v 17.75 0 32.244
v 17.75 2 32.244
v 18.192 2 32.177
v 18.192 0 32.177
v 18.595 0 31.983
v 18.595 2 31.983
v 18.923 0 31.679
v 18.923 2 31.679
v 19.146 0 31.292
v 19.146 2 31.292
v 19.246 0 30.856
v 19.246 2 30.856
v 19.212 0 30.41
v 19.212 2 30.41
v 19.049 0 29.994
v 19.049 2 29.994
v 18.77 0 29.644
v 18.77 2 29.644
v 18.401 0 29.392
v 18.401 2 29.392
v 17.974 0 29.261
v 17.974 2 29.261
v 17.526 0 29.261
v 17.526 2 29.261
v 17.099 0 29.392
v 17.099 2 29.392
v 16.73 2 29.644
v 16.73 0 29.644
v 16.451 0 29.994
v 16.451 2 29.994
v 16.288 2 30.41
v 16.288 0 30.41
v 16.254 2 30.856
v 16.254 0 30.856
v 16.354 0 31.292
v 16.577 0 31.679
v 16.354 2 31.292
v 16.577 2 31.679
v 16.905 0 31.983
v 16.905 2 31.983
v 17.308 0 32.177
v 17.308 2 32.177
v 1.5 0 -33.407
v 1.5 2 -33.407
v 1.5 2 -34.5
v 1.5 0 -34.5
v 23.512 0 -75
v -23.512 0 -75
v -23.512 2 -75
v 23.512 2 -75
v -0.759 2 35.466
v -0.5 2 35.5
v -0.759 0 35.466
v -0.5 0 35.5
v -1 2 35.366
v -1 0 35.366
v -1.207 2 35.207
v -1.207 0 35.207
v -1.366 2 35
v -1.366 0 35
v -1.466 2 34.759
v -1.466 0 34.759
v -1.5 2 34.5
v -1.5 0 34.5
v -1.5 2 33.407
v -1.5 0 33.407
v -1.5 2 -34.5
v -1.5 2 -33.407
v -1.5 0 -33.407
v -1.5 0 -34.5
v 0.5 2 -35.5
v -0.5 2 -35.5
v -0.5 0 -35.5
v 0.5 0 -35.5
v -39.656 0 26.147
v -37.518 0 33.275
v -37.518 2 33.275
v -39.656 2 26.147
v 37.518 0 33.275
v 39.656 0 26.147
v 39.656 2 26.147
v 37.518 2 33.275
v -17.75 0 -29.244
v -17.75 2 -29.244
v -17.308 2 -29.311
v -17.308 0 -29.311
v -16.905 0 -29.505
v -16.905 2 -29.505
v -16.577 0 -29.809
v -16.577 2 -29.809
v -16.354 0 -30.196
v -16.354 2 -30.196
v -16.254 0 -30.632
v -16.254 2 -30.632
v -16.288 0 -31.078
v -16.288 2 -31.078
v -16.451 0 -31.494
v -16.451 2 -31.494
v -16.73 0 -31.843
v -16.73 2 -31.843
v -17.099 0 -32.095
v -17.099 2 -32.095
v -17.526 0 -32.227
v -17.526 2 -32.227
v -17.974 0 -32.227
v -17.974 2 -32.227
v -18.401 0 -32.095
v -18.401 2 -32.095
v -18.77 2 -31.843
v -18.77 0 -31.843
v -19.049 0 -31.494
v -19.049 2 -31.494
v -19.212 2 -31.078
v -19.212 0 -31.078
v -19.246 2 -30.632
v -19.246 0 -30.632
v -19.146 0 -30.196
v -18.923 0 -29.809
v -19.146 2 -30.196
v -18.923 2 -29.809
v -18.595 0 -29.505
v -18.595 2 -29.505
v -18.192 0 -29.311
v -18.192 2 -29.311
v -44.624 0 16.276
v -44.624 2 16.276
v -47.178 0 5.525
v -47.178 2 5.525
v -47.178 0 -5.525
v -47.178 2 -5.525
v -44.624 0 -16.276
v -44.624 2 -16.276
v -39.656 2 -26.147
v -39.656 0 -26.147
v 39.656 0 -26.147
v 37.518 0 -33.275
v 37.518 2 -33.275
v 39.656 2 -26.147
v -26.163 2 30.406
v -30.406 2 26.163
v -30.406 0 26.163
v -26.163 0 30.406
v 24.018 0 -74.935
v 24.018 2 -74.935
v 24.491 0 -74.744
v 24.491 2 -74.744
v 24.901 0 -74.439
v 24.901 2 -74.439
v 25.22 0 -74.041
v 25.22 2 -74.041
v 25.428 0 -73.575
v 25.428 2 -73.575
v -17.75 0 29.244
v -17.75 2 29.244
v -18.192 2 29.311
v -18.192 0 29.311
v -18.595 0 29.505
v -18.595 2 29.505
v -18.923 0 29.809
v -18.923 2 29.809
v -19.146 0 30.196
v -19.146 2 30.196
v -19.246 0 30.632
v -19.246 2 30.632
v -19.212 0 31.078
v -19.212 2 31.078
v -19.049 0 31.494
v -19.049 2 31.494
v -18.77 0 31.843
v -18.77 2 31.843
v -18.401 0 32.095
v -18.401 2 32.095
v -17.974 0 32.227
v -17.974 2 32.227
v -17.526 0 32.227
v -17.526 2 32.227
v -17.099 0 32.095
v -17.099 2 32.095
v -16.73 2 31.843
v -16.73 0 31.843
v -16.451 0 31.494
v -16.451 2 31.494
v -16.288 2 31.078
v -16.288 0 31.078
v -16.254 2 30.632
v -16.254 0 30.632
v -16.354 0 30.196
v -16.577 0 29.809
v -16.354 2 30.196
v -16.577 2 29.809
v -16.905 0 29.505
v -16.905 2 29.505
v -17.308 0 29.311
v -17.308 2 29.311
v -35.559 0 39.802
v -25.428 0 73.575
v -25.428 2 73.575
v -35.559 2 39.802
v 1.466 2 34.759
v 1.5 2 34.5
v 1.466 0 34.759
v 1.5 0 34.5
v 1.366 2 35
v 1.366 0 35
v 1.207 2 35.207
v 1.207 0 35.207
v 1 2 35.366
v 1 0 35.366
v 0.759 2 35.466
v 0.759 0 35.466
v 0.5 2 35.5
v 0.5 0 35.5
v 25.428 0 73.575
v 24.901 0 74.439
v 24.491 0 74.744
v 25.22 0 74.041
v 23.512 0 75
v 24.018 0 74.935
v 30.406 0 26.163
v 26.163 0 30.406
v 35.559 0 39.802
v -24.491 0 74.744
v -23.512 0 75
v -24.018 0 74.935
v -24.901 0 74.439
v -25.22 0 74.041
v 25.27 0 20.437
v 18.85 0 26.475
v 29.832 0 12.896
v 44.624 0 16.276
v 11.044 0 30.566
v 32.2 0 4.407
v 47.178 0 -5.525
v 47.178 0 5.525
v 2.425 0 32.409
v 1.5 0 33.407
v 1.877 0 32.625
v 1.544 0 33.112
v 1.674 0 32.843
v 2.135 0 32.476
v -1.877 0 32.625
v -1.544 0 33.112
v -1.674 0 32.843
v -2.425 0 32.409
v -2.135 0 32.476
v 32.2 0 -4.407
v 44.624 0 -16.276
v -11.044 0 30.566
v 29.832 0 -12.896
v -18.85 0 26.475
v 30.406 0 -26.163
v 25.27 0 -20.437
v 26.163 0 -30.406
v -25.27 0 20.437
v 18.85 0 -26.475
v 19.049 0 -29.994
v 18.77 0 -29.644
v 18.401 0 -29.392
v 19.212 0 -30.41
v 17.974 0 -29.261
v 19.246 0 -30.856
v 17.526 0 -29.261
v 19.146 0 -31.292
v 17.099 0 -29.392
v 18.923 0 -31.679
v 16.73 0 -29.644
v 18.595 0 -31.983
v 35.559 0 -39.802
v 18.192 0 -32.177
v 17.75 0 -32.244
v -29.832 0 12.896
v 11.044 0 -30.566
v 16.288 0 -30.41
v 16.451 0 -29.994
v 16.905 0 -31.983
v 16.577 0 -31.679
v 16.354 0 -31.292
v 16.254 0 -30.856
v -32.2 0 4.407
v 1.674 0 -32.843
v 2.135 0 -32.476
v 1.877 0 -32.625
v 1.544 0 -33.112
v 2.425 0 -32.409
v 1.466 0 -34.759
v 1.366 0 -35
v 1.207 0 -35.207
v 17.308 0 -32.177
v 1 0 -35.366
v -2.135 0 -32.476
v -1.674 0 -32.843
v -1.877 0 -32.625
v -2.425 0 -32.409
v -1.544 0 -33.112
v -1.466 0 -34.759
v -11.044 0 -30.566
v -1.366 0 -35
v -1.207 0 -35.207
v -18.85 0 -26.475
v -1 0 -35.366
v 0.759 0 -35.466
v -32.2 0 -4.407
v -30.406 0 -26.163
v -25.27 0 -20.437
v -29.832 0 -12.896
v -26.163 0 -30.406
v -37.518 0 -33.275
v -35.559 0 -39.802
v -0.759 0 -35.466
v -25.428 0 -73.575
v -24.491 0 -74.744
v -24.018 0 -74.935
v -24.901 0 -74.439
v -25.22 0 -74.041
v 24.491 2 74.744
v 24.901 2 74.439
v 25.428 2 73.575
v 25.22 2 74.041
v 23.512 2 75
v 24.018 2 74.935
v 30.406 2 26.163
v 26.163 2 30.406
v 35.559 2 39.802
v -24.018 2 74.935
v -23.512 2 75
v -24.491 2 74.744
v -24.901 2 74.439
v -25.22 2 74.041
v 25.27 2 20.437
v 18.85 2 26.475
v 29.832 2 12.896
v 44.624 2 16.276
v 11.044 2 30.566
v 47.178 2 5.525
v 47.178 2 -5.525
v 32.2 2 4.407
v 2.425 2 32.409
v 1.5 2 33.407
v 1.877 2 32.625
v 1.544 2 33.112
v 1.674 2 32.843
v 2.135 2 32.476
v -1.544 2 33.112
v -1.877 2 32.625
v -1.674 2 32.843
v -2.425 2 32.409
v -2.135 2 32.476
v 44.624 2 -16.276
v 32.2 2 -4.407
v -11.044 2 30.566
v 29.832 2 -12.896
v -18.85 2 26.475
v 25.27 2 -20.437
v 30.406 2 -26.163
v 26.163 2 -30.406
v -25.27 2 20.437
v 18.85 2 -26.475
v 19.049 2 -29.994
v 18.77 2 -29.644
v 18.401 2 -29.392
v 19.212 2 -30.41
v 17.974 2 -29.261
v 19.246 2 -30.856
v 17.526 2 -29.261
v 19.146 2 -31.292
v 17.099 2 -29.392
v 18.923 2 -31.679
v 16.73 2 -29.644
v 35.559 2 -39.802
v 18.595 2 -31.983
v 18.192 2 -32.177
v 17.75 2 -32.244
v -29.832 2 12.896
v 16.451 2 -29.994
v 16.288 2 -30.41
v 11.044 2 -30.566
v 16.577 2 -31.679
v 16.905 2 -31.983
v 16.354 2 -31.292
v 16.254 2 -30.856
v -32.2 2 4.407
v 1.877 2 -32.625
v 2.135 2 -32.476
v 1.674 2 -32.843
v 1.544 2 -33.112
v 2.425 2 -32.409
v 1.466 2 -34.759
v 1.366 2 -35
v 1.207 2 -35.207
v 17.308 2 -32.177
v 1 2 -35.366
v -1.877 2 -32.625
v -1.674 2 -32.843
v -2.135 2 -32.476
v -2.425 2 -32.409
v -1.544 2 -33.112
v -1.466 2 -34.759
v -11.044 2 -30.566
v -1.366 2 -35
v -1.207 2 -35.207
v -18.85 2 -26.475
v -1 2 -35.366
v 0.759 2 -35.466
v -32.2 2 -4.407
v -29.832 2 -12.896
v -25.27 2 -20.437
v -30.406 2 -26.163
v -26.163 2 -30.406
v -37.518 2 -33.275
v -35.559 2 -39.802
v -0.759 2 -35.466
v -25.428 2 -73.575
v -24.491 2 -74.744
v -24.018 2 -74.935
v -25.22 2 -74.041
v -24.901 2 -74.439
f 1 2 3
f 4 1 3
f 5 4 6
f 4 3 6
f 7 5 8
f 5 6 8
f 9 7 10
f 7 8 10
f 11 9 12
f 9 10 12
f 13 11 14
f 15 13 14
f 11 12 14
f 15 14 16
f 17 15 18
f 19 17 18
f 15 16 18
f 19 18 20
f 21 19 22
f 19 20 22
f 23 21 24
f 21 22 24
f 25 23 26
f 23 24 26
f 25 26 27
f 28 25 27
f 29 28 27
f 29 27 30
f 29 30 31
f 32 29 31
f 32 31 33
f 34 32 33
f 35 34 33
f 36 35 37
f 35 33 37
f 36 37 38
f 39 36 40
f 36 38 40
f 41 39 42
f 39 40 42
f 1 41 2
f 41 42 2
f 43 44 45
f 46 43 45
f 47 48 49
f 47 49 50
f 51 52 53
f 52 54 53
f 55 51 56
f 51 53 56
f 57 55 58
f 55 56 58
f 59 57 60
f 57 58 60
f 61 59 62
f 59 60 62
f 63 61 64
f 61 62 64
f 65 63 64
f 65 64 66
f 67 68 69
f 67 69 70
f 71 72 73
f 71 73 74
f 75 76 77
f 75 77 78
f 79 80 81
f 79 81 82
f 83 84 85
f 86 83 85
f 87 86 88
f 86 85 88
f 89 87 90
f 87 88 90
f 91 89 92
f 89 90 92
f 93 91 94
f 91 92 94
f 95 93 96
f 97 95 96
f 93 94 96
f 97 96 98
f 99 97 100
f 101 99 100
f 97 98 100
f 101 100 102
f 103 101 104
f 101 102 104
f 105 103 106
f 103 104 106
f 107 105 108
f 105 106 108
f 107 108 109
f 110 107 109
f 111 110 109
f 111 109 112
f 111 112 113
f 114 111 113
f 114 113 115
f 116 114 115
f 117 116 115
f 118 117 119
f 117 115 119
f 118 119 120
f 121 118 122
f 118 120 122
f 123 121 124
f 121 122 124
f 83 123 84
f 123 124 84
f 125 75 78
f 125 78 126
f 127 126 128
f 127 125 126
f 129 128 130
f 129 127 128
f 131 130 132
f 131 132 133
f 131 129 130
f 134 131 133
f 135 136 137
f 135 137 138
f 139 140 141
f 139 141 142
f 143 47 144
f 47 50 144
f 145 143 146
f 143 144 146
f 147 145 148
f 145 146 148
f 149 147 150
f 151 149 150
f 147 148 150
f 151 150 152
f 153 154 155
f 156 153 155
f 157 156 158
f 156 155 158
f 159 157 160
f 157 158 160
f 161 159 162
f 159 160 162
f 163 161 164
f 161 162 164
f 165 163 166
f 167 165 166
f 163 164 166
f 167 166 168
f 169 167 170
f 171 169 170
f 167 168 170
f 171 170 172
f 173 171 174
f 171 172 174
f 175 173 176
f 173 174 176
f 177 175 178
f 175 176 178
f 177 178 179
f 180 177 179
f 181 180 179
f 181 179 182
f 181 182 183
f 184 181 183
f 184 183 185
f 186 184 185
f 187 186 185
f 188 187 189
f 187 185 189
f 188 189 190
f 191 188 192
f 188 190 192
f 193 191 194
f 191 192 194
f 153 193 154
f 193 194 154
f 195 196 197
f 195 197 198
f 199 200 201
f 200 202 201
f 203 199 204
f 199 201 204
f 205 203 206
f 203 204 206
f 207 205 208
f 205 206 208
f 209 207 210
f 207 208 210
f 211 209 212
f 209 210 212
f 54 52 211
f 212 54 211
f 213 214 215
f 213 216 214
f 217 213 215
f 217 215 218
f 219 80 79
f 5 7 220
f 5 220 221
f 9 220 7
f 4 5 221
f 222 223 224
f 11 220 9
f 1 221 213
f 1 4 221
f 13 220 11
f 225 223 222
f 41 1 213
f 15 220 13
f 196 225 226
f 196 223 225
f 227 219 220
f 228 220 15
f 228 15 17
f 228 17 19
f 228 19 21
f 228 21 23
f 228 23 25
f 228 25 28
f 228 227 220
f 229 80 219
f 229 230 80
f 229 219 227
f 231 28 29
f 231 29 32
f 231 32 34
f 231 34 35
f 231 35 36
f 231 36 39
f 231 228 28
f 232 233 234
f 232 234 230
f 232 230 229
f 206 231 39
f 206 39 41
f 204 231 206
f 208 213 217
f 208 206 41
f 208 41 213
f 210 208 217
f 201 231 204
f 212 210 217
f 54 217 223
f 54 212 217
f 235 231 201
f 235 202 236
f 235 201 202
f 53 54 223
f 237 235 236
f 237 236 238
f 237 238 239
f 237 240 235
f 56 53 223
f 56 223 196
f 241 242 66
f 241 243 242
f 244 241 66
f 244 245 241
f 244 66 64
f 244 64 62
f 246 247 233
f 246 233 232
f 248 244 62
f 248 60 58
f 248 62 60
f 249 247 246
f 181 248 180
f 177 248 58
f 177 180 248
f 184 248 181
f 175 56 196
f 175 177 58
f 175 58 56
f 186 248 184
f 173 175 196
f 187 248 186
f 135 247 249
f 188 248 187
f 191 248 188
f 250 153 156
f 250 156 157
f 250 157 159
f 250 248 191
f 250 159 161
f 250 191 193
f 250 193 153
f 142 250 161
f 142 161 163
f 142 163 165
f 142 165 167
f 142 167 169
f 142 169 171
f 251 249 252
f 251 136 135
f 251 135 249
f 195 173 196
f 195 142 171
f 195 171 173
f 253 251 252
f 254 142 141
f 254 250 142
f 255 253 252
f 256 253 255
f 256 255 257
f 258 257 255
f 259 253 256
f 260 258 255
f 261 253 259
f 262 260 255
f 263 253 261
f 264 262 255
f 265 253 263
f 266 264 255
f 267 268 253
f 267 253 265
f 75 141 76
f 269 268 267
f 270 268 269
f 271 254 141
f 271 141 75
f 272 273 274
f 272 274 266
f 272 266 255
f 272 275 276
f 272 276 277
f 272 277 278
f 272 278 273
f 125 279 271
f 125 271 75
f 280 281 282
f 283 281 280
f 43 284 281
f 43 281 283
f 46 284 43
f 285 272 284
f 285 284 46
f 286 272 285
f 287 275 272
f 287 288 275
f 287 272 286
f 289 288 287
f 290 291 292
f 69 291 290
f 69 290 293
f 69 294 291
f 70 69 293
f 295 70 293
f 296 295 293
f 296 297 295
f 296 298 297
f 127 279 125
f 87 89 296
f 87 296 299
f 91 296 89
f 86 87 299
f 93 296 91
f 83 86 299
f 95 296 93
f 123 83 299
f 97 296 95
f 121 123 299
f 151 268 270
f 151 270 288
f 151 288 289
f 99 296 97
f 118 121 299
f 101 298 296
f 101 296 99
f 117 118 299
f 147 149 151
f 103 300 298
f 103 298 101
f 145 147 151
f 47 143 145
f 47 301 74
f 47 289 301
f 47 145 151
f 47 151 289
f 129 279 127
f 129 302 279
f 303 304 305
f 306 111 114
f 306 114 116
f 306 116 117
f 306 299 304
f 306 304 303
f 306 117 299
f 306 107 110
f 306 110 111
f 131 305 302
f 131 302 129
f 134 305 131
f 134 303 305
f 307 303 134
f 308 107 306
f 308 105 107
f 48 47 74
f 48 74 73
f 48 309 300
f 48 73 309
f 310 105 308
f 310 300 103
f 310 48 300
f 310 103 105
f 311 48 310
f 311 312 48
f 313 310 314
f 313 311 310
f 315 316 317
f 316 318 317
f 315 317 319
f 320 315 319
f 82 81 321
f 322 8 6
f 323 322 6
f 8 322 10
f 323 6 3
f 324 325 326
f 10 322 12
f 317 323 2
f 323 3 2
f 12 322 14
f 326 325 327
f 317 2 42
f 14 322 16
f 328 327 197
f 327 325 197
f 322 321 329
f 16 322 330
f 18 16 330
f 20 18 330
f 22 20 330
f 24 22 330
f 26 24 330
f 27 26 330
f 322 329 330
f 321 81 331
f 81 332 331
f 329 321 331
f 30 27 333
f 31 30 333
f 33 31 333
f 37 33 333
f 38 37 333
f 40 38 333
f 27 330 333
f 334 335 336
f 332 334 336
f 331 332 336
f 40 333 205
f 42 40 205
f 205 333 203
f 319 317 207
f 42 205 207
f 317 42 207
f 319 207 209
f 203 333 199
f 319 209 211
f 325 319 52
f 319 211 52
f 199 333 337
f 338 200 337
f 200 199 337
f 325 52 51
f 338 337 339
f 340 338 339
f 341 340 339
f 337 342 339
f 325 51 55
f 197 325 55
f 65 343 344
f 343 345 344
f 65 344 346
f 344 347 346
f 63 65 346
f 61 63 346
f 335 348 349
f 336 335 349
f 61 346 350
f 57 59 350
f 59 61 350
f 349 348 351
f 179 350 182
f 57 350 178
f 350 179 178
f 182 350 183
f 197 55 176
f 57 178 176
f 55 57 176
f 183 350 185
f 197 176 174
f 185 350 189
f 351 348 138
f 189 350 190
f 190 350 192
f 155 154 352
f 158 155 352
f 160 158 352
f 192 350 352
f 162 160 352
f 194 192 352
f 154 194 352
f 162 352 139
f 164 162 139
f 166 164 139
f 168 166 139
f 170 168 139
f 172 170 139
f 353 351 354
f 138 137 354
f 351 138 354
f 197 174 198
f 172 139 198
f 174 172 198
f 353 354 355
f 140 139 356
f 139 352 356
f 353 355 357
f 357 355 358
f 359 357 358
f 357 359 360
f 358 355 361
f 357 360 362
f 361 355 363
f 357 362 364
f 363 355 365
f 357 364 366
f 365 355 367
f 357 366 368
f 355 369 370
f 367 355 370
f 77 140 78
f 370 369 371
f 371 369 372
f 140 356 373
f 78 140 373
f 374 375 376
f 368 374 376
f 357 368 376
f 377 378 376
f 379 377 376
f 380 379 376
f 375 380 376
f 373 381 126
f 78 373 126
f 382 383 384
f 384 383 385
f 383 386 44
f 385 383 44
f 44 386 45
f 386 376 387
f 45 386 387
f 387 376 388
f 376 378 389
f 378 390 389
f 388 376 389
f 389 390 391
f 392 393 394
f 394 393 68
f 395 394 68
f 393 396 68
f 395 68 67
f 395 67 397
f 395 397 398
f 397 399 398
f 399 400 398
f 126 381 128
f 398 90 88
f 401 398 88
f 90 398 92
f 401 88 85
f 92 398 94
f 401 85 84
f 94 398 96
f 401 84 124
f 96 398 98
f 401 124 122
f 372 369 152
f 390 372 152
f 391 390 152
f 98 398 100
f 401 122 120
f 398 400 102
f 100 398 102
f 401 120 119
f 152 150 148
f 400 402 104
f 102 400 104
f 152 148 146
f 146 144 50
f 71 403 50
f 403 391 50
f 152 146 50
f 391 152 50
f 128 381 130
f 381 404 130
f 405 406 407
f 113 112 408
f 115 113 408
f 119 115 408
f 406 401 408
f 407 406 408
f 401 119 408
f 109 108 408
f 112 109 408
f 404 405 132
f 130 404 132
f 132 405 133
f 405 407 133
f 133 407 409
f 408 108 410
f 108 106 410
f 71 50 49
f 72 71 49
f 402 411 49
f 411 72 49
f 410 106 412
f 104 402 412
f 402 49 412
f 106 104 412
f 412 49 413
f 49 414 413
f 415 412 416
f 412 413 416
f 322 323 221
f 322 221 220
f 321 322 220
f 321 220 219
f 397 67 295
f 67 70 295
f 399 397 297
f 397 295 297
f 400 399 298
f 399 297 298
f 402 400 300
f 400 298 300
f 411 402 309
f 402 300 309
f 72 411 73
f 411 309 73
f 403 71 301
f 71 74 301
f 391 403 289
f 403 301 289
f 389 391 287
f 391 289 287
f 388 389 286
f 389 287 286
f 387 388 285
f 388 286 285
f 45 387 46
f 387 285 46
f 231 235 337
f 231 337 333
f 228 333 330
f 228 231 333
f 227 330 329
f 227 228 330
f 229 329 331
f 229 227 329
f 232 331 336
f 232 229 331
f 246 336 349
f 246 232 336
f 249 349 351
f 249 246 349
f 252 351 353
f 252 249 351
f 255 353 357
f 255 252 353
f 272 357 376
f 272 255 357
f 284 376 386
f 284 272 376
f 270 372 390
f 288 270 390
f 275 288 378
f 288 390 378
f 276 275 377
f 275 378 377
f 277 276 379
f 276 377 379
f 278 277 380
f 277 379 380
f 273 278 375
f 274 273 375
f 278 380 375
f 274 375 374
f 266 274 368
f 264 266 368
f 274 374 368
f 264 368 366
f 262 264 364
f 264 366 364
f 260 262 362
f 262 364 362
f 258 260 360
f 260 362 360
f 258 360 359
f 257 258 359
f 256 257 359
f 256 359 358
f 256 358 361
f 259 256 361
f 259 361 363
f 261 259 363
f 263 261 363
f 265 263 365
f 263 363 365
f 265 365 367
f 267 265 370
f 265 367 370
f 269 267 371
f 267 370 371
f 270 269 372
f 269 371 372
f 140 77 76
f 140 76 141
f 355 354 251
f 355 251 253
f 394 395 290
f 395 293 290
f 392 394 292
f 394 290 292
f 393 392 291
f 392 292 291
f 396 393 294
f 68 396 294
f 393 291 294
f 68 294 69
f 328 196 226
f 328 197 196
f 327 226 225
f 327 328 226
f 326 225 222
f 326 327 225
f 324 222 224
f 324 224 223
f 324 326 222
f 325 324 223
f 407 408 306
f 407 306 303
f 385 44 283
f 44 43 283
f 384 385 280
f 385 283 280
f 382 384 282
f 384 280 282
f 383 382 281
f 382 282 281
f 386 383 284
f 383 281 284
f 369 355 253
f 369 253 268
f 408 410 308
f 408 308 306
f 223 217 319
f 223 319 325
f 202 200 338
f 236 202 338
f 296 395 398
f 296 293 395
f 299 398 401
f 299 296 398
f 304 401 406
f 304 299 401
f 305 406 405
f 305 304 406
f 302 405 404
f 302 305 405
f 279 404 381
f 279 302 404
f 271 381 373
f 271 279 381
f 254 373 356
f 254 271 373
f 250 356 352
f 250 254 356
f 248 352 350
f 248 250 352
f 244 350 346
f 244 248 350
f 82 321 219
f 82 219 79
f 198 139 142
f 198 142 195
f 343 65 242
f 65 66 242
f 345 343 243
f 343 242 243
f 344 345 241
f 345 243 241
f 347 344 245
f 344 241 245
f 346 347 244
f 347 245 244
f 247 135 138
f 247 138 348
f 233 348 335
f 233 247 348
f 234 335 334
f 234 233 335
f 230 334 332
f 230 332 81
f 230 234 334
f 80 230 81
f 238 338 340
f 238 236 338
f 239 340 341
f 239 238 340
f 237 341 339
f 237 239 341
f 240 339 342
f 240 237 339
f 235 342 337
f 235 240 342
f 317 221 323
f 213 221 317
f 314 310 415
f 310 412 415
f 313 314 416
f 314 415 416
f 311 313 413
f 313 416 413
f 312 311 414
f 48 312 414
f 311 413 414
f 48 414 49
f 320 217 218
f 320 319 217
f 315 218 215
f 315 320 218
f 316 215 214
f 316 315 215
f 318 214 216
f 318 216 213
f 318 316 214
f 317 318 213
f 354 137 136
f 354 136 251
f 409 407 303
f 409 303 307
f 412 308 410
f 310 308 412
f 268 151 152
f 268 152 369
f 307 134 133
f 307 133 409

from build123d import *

# Parameters (mm, degrees)
SKETCH1_R           = 32.5
BOSS_EXTRUDE1_DEPTH = 2
CUT_EXTRUDE1_DEPTH  = 2
SKETCH3_W           = 3
SKETCH3_H           = 6
CUT_EXTRUDE2_DEPTH  = 2
FILLET1_R           = 1
FILLET2_R           = 2
SKETCH4_R           = 1.5
CUT_EXTRUDE3_DEPTH  = 2


with BuildPart() as part:
    # Sketch1 → Boss-Extrude1 (new body)
    with BuildSketch(Plane(origin=(0, 0, 0), x_dir=(1, 0, 0), z_dir=(0, 1, 0))):
        with BuildLine():
            Line((-39.655963303, 26.146788991), (-25, 75))
            Line((-25, 75), (25, 75))
            Line((25, 75), (39.655963303, 26.146788991))
            ThreePointArc((39.655963303, 26.146788991), (47.5, 0), (39.655963303, -26.146788991))
            Line((39.655963303, -26.146788991), (25, -75))
            Line((25, -75), (-25, -75))
            Line((-25, -75), (-39.655963303, -26.146788991))
            ThreePointArc((-39.655963303, -26.146788991), (-47.5, 0), (-39.655963303, 26.146788991))
        make_face()
        with Locations(Location((0, 0, 0), (0, 0, 270))):
            Circle(SKETCH1_R, mode=Mode.SUBTRACT)
    extrude(amount=BOSS_EXTRUDE1_DEPTH)

    # Sketch2 → Cut-Extrude1 (cut)
    with BuildSketch(Plane(origin=(0, 2, 0), x_dir=(1, 0, 0), z_dir=(0, 1, 0))):
        Polygon((41.012193309, 36.769552622), (30.405591591, 26.162950904), (26.162950904, 30.405591591), (36.769552622, 41.012193309), align=None)
        Polygon((-41.012193309, 36.769552622), (-36.769552622, 41.012193309), (-26.162950904, 30.405591591), (-30.405591591, 26.162950904), align=None)
        Polygon((36.769552622, -41.012193309), (26.162950904, -30.405591591), (30.405591591, -26.162950904), (41.012193309, -36.769552622), align=None)
        Polygon((-41.012193309, -36.769552622), (-30.405591591, -26.162950904), (-26.162950904, -30.405591591), (-36.769552622, -41.012193309), align=None)
    extrude(amount=-CUT_EXTRUDE1_DEPTH, mode=Mode.SUBTRACT)

    # Sketch3 → Cut-Extrude2 (cut)
    with BuildSketch(Plane(origin=(0, 2, 0), x_dir=(1, 0, 0), z_dir=(0, 1, 0))):
        with Locations((0, 32.5)):
            Rectangle(SKETCH3_W, SKETCH3_H)
        with Locations((0, -32.5)):
            Rectangle(SKETCH3_W, SKETCH3_H)
    extrude(amount=-CUT_EXTRUDE2_DEPTH, mode=Mode.SUBTRACT)

    # Fillet1
    fillet1_edges = [part.edges().sort_by_distance(p)[0] for p in [
        (-1.5, 1, -32.465366161),
        (1.5, 1, -32.465366161),
        (1.5, 1, -35.5),
        (-1.5, 1, -35.5),
        (1.5, 1, 32.465366161),
        (-1.5, 1, 32.465366161),
        (-1.5, 1, 35.5),
        (1.5, 1, 35.5),
    ]]
    fillet(fillet1_edges, radius=FILLET1_R)

    # Fillet2
    fillet2_edges = [part.edges().sort_by_distance(p)[0] for p in [
        (25, 1, 75),
        (-25, 1, 75),
        (-25, 1, -75),
        (25, 1, -75),
    ]]
    fillet(fillet2_edges, radius=FILLET2_R)

    # Sketch4 → Cut-Extrude3 (cut)
    with BuildSketch(Plane(origin=(0, 2, 0), x_dir=(1, 0, 0), z_dir=(0, 1, 0))):
        with Locations(Location((-17.75, 30.743901834, 0), (0, 0, 270))):
            Circle(SKETCH4_R)
        with Locations(Location((17.75, 30.743901834, 0), (0, 0, 90))):
            Circle(SKETCH4_R)
        with Locations(Location((17.75, -30.743901834, 0), (0, 0, 270))):
            Circle(SKETCH4_R)
        with Locations(Location((-17.75, -30.743901834, 0), (0, 0, 90))):
            Circle(SKETCH4_R)
    extrude(amount=-CUT_EXTRUDE3_DEPTH, mode=Mode.SUBTRACT)


solid = part.part
